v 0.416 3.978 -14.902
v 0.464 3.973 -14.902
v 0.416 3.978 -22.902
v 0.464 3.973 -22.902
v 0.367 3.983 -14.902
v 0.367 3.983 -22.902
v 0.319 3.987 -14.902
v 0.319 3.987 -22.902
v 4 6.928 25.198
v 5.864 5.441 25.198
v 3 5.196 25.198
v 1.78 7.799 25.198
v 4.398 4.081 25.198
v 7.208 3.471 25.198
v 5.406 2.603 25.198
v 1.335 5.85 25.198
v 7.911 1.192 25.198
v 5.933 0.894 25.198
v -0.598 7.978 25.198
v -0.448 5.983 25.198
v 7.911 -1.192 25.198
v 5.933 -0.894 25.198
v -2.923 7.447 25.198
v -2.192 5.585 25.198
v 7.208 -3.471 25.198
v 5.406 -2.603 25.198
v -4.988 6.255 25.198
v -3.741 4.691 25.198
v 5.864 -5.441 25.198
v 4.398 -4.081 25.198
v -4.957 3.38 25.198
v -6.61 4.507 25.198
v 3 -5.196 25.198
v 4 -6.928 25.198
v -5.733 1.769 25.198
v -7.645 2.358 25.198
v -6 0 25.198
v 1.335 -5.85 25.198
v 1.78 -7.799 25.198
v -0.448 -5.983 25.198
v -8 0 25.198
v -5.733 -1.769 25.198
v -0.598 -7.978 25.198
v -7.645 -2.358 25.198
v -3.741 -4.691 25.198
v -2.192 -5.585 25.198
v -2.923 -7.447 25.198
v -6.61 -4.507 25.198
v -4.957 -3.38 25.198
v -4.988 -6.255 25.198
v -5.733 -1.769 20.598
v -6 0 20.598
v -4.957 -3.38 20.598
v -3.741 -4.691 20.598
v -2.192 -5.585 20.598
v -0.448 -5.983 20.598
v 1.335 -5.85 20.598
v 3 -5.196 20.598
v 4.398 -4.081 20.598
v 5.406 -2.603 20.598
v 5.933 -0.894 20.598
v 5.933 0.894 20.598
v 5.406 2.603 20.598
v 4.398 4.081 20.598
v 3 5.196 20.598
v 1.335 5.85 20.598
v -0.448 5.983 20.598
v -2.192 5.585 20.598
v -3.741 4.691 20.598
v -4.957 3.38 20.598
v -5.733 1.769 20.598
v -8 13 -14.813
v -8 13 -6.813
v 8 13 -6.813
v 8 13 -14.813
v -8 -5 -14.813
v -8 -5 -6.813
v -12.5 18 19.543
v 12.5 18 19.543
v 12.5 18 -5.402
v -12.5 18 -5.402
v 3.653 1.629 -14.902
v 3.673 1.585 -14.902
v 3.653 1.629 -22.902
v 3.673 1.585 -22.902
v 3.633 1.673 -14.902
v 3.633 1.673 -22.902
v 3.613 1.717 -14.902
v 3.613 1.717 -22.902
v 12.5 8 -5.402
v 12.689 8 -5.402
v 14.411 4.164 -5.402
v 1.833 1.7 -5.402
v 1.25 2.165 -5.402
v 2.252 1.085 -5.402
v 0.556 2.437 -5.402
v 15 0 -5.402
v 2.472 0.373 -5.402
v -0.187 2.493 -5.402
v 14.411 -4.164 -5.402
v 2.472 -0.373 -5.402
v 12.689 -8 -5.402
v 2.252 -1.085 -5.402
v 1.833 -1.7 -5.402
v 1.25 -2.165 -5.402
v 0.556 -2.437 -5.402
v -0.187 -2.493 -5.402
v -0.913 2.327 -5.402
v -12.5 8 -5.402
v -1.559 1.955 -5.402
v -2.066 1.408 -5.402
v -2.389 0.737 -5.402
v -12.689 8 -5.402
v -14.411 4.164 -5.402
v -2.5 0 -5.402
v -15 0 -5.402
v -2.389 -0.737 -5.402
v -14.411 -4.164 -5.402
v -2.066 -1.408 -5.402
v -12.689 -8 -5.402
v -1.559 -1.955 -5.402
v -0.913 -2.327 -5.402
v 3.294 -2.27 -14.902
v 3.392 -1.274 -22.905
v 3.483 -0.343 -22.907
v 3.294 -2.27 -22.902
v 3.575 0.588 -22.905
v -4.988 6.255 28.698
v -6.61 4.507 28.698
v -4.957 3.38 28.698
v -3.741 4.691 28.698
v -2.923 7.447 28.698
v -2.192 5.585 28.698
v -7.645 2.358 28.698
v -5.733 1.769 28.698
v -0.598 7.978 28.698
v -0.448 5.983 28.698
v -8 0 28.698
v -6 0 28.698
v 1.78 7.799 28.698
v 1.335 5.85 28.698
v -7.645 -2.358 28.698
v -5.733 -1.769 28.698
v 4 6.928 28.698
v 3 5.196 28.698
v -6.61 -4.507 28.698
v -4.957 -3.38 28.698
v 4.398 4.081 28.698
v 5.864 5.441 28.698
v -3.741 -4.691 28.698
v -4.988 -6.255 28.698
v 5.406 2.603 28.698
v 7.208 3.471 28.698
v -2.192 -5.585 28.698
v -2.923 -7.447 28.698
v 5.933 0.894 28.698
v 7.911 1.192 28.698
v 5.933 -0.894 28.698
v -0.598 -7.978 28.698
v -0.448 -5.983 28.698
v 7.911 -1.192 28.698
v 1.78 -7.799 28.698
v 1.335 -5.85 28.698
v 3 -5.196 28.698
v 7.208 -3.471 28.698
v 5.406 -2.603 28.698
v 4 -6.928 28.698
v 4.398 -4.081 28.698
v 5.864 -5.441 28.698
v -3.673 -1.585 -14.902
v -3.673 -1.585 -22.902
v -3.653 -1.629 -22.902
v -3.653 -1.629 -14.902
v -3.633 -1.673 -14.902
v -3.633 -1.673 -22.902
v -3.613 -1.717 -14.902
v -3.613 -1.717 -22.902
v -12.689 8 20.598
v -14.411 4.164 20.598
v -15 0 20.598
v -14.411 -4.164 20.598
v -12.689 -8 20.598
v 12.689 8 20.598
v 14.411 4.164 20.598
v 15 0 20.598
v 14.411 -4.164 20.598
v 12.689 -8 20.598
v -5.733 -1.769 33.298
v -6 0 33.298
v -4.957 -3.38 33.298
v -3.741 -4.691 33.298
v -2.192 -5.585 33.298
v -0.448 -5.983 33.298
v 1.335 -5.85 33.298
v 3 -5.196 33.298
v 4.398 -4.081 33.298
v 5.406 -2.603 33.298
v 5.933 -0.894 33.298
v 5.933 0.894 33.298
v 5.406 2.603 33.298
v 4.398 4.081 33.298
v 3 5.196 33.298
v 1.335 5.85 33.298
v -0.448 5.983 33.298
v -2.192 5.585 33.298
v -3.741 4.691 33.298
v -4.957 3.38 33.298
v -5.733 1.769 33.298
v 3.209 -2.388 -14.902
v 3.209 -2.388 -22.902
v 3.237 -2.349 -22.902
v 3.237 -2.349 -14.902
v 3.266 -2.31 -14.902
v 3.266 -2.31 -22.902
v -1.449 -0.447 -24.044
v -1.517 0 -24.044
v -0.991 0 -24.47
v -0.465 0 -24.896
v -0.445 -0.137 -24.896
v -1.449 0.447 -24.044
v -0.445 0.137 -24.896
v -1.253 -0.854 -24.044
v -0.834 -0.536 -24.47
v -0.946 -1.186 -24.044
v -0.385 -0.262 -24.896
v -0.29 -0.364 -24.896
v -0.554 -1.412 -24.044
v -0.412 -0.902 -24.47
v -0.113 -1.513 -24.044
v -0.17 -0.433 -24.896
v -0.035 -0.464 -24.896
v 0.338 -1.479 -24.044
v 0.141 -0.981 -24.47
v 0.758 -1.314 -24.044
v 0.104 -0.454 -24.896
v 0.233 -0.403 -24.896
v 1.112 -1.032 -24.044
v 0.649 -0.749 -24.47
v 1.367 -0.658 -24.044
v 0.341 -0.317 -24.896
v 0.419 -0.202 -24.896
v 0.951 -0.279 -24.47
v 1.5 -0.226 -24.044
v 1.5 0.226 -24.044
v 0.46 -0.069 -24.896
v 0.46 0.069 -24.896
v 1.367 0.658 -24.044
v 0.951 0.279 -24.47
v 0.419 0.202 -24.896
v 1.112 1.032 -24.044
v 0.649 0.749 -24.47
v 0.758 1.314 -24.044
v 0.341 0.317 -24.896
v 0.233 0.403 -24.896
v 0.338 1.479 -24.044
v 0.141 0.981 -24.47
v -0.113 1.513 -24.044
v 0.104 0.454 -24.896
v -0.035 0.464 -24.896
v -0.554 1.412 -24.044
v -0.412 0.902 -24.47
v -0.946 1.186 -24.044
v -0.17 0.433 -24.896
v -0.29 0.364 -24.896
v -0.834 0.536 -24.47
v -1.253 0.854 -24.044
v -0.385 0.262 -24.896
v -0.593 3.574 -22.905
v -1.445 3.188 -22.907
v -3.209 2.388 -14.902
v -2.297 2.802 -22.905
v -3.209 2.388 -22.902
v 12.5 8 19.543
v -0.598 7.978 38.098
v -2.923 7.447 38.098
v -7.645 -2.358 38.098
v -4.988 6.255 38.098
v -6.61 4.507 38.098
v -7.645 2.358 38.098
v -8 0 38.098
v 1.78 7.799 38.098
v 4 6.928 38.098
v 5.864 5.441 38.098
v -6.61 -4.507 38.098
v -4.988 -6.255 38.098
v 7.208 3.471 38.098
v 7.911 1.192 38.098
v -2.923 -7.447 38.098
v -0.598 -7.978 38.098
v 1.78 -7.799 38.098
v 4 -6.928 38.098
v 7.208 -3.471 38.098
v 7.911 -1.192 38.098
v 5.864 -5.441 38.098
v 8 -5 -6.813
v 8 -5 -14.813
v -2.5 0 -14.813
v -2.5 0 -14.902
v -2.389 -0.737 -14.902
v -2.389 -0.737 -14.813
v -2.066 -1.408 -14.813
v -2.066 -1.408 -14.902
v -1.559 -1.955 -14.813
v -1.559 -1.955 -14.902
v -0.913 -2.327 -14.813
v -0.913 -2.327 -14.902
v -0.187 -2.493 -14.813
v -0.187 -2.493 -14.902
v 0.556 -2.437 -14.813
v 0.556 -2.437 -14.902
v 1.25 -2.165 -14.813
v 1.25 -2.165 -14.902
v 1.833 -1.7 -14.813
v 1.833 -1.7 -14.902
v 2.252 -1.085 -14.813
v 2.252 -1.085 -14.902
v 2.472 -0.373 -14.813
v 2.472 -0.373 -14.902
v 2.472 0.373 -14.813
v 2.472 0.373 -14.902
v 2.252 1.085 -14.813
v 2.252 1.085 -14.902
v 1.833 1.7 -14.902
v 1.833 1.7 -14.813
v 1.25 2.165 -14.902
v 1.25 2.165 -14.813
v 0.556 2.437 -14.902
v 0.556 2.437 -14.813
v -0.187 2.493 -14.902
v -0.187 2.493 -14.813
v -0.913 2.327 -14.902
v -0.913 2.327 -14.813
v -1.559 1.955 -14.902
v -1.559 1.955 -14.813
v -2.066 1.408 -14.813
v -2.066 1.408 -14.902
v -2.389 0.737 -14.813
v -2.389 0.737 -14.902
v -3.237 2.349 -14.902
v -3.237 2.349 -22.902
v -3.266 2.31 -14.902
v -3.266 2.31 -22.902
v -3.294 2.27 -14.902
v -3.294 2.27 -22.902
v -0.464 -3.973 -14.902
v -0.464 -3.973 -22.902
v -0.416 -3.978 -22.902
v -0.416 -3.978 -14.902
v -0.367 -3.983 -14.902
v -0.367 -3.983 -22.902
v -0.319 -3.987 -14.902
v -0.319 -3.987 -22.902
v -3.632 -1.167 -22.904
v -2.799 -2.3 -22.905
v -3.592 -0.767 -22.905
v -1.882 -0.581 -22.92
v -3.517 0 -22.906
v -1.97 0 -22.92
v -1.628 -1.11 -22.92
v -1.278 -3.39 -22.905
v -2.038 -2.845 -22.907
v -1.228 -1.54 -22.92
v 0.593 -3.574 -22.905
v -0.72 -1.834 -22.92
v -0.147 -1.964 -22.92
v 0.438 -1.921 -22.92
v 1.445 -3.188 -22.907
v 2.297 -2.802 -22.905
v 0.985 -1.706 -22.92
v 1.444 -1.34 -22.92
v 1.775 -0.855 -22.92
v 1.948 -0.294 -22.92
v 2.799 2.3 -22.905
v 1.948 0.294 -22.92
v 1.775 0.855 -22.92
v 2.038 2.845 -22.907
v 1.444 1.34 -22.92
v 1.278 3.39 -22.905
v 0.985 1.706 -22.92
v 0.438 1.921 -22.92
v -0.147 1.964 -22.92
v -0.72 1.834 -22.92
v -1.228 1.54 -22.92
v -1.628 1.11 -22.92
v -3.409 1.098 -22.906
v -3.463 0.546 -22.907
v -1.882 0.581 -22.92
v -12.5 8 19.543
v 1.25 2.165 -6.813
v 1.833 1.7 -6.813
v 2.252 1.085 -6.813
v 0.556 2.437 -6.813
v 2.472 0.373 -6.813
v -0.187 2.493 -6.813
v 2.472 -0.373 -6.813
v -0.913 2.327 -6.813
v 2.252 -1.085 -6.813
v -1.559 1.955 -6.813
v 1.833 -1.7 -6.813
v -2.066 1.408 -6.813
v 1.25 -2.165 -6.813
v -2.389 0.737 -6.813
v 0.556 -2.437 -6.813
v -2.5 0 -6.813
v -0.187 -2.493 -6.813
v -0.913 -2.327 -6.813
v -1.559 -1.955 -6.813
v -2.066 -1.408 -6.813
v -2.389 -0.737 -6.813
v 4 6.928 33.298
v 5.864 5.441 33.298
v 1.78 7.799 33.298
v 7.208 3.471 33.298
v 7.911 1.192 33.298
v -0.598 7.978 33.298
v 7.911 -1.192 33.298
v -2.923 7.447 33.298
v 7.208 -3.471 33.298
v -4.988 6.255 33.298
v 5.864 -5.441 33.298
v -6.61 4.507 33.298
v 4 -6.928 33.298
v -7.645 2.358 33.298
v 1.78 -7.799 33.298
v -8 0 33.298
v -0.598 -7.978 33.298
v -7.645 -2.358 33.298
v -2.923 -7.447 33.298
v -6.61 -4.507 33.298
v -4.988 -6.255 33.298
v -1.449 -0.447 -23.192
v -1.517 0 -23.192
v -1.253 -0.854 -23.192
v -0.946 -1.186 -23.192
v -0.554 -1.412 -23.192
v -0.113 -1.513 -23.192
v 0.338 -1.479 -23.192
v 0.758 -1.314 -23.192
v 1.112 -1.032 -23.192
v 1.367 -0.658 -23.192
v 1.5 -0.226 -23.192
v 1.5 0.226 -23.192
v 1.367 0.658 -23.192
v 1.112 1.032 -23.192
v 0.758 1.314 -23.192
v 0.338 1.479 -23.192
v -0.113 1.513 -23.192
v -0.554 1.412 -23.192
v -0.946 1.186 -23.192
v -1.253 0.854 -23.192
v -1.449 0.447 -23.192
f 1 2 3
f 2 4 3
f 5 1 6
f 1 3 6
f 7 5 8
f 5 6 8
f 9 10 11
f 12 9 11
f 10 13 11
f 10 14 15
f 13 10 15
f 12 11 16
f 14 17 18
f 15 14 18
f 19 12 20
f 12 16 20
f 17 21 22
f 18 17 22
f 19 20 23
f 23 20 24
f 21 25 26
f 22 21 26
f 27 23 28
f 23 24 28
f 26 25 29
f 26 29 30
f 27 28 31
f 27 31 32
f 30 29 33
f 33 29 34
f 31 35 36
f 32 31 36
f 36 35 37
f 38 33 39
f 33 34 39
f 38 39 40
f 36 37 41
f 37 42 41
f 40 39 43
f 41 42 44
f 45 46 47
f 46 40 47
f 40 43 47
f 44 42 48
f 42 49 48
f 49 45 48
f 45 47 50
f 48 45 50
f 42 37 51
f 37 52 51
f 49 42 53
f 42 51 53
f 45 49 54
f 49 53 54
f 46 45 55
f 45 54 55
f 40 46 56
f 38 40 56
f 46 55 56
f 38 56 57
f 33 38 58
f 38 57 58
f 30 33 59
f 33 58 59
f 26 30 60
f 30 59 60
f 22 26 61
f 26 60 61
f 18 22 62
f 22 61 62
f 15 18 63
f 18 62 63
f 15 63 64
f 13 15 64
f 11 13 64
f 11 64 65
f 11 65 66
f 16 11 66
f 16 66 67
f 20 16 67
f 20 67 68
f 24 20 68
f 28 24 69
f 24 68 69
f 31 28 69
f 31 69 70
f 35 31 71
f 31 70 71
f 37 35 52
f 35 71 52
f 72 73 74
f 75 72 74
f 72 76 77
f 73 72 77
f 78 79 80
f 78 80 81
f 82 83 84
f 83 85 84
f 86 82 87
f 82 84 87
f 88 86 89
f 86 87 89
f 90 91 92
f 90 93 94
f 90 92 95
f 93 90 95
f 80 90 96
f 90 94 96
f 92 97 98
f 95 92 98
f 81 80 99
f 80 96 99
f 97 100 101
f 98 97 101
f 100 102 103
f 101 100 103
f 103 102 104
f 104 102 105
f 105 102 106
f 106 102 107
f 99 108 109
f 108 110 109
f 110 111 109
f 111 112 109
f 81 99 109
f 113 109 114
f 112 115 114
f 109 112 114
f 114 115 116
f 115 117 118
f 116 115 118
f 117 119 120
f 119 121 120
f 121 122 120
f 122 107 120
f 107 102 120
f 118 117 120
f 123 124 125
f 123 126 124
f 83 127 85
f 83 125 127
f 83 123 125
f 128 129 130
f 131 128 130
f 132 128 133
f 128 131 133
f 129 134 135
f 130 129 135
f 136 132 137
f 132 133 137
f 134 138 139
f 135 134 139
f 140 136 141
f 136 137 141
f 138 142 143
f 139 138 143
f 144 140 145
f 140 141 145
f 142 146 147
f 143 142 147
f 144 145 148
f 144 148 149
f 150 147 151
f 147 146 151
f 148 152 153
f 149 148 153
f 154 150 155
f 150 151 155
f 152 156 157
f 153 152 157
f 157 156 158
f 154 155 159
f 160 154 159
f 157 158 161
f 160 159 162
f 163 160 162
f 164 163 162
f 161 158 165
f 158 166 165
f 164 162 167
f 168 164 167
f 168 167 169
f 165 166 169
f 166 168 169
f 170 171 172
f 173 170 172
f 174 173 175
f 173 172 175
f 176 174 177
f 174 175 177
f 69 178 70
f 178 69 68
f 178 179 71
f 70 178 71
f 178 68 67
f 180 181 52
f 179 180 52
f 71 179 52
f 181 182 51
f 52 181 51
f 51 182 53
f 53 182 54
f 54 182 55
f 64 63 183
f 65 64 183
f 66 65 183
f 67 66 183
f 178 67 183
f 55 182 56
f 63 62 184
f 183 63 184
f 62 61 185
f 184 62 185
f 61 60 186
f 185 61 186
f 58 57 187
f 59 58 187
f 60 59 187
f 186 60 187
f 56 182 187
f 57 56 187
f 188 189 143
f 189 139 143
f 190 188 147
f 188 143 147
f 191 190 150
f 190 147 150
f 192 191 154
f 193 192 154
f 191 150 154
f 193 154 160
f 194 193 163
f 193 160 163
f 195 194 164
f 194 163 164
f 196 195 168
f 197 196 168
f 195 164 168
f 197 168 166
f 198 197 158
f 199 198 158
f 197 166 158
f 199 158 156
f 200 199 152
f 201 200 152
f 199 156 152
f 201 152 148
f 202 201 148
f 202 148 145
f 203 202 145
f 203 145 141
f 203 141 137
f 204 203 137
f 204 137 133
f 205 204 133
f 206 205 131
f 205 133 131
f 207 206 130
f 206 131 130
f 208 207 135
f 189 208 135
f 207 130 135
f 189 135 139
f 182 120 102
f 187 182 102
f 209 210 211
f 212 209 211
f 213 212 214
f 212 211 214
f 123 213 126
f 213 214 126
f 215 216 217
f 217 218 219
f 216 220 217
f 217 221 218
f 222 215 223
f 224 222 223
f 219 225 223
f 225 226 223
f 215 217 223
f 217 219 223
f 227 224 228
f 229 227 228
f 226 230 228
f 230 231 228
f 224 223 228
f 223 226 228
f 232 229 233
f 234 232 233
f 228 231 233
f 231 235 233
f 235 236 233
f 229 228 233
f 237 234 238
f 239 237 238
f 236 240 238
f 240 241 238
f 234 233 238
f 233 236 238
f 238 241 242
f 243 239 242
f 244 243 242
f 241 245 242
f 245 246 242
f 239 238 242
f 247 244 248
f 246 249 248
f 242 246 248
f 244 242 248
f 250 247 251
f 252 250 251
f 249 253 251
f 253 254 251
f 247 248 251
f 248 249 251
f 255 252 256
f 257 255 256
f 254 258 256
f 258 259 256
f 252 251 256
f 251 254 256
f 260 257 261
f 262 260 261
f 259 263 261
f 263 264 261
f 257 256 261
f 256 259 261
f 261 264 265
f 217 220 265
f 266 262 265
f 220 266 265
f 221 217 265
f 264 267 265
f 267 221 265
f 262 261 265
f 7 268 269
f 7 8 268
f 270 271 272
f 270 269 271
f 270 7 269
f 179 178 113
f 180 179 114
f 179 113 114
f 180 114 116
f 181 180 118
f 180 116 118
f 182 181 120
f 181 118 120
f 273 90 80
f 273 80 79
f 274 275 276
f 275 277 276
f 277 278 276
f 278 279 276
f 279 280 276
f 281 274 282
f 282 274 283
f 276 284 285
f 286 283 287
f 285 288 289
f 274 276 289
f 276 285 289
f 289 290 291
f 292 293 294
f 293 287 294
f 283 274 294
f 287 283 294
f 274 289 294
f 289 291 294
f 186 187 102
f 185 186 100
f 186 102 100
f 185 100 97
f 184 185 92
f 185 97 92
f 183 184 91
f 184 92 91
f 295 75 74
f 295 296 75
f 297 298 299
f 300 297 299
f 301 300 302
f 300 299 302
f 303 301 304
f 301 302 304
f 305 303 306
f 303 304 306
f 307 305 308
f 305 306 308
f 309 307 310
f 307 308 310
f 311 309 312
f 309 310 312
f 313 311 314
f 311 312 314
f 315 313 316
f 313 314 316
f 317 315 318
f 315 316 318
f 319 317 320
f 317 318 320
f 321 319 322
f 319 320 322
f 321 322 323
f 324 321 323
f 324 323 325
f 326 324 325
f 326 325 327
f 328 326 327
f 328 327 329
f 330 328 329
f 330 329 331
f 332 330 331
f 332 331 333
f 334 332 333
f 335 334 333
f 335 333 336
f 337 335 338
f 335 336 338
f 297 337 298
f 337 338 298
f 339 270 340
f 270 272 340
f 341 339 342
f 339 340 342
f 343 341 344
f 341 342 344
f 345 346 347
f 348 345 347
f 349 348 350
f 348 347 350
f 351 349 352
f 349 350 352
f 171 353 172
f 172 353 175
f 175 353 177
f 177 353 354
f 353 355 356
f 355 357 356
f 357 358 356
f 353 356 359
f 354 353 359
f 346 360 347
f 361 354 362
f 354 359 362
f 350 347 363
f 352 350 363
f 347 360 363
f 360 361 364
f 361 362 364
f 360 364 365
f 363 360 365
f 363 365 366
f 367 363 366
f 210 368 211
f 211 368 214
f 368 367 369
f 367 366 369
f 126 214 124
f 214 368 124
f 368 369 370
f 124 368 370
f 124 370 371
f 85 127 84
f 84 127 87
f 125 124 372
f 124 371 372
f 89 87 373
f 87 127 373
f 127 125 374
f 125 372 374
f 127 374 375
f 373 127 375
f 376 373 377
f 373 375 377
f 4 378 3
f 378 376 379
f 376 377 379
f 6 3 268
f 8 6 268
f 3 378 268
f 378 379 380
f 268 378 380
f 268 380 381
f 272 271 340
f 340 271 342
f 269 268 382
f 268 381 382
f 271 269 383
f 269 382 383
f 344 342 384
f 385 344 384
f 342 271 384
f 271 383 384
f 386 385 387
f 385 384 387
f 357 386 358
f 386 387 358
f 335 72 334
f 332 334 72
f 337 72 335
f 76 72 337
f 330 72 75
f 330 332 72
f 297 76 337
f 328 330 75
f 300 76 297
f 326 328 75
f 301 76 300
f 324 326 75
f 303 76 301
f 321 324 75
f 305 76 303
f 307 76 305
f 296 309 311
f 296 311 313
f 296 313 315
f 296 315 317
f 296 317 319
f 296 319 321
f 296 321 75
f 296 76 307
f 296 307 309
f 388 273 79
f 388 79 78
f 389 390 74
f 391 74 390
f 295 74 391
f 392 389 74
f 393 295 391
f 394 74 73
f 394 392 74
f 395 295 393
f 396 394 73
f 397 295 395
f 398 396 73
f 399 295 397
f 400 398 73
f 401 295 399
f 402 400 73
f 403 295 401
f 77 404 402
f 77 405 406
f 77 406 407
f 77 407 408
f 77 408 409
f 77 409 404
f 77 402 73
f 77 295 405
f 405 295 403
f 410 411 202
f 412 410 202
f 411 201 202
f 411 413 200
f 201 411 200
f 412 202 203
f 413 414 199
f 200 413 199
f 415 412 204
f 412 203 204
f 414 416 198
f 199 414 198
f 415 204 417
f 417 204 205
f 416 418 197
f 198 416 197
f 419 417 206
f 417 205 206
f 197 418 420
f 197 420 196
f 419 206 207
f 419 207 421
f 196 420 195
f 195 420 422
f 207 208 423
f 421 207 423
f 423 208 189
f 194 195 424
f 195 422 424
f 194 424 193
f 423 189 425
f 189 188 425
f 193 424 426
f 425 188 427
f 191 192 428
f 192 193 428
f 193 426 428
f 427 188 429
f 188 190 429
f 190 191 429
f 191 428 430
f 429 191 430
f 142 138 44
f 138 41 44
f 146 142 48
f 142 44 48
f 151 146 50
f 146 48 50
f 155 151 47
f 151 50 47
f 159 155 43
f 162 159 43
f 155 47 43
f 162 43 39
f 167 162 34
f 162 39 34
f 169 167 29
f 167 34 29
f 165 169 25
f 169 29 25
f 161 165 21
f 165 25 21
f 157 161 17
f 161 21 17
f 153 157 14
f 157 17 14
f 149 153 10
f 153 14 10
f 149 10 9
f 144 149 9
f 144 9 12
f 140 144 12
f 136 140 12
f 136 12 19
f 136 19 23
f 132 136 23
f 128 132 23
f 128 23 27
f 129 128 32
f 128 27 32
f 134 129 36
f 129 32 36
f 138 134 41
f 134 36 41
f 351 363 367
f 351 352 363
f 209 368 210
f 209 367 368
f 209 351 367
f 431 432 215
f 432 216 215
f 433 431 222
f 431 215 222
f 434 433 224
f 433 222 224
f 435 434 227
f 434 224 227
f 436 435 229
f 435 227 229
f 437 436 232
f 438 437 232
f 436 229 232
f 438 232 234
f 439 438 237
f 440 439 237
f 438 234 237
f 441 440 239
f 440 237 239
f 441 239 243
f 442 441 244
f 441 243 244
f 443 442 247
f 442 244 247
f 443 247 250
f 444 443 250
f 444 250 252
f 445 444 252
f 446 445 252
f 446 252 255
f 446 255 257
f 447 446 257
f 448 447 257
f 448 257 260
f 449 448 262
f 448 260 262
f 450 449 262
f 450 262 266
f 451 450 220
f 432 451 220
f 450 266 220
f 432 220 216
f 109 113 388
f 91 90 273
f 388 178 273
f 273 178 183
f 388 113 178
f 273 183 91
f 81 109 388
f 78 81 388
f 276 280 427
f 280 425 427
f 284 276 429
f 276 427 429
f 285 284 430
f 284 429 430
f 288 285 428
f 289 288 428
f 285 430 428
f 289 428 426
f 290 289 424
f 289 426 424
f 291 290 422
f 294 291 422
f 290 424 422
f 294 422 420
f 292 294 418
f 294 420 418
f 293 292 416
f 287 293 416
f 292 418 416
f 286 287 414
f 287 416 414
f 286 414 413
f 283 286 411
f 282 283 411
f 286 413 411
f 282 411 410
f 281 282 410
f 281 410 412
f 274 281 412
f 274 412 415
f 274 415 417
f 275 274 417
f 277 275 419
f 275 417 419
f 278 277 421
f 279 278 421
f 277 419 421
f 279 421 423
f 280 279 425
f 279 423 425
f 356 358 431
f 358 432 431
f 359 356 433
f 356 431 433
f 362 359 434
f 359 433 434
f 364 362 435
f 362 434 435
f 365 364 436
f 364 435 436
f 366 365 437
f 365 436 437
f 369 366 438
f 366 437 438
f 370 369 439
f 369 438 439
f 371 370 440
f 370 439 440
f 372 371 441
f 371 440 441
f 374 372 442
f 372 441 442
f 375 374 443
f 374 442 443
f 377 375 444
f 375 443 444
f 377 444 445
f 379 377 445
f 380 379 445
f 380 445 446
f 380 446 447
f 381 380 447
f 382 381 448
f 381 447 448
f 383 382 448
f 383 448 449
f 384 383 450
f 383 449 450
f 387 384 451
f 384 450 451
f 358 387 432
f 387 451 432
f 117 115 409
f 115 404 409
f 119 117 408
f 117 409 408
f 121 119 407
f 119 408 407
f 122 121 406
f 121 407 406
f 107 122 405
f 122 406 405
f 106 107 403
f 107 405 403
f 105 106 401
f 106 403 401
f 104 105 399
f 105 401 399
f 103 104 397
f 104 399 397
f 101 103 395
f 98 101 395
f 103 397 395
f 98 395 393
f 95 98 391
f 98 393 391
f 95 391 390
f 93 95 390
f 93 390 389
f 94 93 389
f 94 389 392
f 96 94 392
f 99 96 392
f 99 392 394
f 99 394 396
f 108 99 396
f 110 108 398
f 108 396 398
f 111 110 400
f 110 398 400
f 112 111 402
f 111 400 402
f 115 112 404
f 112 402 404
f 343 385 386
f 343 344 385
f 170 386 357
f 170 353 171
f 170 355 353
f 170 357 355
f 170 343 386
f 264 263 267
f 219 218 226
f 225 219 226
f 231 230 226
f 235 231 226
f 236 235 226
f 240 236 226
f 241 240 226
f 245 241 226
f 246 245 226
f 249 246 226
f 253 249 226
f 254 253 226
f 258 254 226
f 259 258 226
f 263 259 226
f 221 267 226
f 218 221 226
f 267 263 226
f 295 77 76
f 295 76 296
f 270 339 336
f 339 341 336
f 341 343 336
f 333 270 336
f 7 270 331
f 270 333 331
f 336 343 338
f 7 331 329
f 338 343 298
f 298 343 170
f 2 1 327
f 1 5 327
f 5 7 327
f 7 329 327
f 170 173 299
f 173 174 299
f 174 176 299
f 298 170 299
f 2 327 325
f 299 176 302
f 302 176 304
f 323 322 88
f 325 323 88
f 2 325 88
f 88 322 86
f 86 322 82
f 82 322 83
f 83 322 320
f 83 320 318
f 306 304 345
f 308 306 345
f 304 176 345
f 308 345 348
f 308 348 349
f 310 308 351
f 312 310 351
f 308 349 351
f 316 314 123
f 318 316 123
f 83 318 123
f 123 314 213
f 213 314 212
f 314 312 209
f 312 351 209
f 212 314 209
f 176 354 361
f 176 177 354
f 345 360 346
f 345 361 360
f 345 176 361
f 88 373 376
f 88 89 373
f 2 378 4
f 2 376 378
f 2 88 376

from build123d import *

# Parameters (mm, degrees)
F2_W          = 37.102
F2_H          = 46.096
F2_W_2        = 30
F2_H_2        = 16
F3_DEPTH      = 27.4
F4_W          = 5.5
F4_H          = 8
F4_W_2        = 5
F5_DEPTH      = 5
F5_DEPTH_BACK = 13
F6_R          = 5.9111779492
F7_DEPTH      = 25
F8_W          = 25
F8_H          = 24.945173396
F9_DEPTH      = 10


with BuildPart() as f1:
    # F0 (on Front) → F1 (revolve)
    with BuildSketch(Plane.XZ):
        Polygon((-1.5167587905, -24.0440348498), (-0.4654595977, -24.895950213), (0, -24.895950213), (0, -5.4683293174), (0, 38.0978930385), (-8, 38.0978930385), (-8, 33.2978930385), (-6, 33.2978930385), (-6, 28.6978930385), (-8, 28.6978930385), (-8, 25.1978930385), (-6, 25.1978930385), (-6, 20.5978930385), (-15, 20.5978930385), (-15, -5.4021069615), (-2.5, -5.4021069615), (-2.5, -14.9021069615), (-4, -14.9021069615), (-4, -22.9021069615), (-1.9699050371, -22.9202326714), (-1.5167587905, -23.1921206525), align=None)
    revolve(axis=Axis((0, 0, 26.8247116869), (0, 0, 1)))

    # F2 (on face) → F3 (cut)
    with BuildSketch(Plane.XY.offset(20.5978930385)):
        Rectangle(F2_W, F2_H)
        Rectangle(F2_W_2, F2_H_2, mode=Mode.SUBTRACT)
    extrude(amount=-F3_DEPTH, mode=Mode.SUBTRACT)

    # F4 (on Front) → F5 (join, two sides)
    with BuildSketch(Plane.XZ) as f5_sk:
        Polygon((8, -6.812995024), (2.5, -6.812995024), (2.5, -14.812995024), (4, -14.812995024), (8, -14.812995024), align=None)
        with Locations((-5.25, -10.812995024)):
            Rectangle(F4_W, F4_H)
        with Locations((0, -10.812995024)):
            Rectangle(F4_W_2, F4_H)
    extrude(amount=F5_DEPTH)
    extrude(f5_sk.sketch, amount=-F5_DEPTH_BACK)

    # F6 (on face) → F7 (cut)
    with BuildSketch(Plane(origin=(0, 0, -14.812995024), x_dir=(1, 0, 0), z_dir=(0, 0, -1))):
        Circle(F6_R)
        Polygon((3.6810046325, -1.6683939069), (0.3956308093, -4.0220404767), (-3.2853738232, -2.3536465697), (-3.6810046325, 1.6683939069), (-0.3956308093, 4.0220404767), (3.2853738232, 2.3536465697), align=None, mode=Mode.SUBTRACT)
    extrude(amount=F7_DEPTH, mode=Mode.SUBTRACT)

    # F8 (on face) → F9 (join)
    with BuildSketch(Plane(origin=(0, 8, 0), x_dir=(-1, 0, 0), z_dir=(0, 1, 0))):
        with Locations((0, 7.0704797366)):
            Rectangle(F8_W, F8_H)
    extrude(amount=F9_DEPTH)


solid = f1.part
